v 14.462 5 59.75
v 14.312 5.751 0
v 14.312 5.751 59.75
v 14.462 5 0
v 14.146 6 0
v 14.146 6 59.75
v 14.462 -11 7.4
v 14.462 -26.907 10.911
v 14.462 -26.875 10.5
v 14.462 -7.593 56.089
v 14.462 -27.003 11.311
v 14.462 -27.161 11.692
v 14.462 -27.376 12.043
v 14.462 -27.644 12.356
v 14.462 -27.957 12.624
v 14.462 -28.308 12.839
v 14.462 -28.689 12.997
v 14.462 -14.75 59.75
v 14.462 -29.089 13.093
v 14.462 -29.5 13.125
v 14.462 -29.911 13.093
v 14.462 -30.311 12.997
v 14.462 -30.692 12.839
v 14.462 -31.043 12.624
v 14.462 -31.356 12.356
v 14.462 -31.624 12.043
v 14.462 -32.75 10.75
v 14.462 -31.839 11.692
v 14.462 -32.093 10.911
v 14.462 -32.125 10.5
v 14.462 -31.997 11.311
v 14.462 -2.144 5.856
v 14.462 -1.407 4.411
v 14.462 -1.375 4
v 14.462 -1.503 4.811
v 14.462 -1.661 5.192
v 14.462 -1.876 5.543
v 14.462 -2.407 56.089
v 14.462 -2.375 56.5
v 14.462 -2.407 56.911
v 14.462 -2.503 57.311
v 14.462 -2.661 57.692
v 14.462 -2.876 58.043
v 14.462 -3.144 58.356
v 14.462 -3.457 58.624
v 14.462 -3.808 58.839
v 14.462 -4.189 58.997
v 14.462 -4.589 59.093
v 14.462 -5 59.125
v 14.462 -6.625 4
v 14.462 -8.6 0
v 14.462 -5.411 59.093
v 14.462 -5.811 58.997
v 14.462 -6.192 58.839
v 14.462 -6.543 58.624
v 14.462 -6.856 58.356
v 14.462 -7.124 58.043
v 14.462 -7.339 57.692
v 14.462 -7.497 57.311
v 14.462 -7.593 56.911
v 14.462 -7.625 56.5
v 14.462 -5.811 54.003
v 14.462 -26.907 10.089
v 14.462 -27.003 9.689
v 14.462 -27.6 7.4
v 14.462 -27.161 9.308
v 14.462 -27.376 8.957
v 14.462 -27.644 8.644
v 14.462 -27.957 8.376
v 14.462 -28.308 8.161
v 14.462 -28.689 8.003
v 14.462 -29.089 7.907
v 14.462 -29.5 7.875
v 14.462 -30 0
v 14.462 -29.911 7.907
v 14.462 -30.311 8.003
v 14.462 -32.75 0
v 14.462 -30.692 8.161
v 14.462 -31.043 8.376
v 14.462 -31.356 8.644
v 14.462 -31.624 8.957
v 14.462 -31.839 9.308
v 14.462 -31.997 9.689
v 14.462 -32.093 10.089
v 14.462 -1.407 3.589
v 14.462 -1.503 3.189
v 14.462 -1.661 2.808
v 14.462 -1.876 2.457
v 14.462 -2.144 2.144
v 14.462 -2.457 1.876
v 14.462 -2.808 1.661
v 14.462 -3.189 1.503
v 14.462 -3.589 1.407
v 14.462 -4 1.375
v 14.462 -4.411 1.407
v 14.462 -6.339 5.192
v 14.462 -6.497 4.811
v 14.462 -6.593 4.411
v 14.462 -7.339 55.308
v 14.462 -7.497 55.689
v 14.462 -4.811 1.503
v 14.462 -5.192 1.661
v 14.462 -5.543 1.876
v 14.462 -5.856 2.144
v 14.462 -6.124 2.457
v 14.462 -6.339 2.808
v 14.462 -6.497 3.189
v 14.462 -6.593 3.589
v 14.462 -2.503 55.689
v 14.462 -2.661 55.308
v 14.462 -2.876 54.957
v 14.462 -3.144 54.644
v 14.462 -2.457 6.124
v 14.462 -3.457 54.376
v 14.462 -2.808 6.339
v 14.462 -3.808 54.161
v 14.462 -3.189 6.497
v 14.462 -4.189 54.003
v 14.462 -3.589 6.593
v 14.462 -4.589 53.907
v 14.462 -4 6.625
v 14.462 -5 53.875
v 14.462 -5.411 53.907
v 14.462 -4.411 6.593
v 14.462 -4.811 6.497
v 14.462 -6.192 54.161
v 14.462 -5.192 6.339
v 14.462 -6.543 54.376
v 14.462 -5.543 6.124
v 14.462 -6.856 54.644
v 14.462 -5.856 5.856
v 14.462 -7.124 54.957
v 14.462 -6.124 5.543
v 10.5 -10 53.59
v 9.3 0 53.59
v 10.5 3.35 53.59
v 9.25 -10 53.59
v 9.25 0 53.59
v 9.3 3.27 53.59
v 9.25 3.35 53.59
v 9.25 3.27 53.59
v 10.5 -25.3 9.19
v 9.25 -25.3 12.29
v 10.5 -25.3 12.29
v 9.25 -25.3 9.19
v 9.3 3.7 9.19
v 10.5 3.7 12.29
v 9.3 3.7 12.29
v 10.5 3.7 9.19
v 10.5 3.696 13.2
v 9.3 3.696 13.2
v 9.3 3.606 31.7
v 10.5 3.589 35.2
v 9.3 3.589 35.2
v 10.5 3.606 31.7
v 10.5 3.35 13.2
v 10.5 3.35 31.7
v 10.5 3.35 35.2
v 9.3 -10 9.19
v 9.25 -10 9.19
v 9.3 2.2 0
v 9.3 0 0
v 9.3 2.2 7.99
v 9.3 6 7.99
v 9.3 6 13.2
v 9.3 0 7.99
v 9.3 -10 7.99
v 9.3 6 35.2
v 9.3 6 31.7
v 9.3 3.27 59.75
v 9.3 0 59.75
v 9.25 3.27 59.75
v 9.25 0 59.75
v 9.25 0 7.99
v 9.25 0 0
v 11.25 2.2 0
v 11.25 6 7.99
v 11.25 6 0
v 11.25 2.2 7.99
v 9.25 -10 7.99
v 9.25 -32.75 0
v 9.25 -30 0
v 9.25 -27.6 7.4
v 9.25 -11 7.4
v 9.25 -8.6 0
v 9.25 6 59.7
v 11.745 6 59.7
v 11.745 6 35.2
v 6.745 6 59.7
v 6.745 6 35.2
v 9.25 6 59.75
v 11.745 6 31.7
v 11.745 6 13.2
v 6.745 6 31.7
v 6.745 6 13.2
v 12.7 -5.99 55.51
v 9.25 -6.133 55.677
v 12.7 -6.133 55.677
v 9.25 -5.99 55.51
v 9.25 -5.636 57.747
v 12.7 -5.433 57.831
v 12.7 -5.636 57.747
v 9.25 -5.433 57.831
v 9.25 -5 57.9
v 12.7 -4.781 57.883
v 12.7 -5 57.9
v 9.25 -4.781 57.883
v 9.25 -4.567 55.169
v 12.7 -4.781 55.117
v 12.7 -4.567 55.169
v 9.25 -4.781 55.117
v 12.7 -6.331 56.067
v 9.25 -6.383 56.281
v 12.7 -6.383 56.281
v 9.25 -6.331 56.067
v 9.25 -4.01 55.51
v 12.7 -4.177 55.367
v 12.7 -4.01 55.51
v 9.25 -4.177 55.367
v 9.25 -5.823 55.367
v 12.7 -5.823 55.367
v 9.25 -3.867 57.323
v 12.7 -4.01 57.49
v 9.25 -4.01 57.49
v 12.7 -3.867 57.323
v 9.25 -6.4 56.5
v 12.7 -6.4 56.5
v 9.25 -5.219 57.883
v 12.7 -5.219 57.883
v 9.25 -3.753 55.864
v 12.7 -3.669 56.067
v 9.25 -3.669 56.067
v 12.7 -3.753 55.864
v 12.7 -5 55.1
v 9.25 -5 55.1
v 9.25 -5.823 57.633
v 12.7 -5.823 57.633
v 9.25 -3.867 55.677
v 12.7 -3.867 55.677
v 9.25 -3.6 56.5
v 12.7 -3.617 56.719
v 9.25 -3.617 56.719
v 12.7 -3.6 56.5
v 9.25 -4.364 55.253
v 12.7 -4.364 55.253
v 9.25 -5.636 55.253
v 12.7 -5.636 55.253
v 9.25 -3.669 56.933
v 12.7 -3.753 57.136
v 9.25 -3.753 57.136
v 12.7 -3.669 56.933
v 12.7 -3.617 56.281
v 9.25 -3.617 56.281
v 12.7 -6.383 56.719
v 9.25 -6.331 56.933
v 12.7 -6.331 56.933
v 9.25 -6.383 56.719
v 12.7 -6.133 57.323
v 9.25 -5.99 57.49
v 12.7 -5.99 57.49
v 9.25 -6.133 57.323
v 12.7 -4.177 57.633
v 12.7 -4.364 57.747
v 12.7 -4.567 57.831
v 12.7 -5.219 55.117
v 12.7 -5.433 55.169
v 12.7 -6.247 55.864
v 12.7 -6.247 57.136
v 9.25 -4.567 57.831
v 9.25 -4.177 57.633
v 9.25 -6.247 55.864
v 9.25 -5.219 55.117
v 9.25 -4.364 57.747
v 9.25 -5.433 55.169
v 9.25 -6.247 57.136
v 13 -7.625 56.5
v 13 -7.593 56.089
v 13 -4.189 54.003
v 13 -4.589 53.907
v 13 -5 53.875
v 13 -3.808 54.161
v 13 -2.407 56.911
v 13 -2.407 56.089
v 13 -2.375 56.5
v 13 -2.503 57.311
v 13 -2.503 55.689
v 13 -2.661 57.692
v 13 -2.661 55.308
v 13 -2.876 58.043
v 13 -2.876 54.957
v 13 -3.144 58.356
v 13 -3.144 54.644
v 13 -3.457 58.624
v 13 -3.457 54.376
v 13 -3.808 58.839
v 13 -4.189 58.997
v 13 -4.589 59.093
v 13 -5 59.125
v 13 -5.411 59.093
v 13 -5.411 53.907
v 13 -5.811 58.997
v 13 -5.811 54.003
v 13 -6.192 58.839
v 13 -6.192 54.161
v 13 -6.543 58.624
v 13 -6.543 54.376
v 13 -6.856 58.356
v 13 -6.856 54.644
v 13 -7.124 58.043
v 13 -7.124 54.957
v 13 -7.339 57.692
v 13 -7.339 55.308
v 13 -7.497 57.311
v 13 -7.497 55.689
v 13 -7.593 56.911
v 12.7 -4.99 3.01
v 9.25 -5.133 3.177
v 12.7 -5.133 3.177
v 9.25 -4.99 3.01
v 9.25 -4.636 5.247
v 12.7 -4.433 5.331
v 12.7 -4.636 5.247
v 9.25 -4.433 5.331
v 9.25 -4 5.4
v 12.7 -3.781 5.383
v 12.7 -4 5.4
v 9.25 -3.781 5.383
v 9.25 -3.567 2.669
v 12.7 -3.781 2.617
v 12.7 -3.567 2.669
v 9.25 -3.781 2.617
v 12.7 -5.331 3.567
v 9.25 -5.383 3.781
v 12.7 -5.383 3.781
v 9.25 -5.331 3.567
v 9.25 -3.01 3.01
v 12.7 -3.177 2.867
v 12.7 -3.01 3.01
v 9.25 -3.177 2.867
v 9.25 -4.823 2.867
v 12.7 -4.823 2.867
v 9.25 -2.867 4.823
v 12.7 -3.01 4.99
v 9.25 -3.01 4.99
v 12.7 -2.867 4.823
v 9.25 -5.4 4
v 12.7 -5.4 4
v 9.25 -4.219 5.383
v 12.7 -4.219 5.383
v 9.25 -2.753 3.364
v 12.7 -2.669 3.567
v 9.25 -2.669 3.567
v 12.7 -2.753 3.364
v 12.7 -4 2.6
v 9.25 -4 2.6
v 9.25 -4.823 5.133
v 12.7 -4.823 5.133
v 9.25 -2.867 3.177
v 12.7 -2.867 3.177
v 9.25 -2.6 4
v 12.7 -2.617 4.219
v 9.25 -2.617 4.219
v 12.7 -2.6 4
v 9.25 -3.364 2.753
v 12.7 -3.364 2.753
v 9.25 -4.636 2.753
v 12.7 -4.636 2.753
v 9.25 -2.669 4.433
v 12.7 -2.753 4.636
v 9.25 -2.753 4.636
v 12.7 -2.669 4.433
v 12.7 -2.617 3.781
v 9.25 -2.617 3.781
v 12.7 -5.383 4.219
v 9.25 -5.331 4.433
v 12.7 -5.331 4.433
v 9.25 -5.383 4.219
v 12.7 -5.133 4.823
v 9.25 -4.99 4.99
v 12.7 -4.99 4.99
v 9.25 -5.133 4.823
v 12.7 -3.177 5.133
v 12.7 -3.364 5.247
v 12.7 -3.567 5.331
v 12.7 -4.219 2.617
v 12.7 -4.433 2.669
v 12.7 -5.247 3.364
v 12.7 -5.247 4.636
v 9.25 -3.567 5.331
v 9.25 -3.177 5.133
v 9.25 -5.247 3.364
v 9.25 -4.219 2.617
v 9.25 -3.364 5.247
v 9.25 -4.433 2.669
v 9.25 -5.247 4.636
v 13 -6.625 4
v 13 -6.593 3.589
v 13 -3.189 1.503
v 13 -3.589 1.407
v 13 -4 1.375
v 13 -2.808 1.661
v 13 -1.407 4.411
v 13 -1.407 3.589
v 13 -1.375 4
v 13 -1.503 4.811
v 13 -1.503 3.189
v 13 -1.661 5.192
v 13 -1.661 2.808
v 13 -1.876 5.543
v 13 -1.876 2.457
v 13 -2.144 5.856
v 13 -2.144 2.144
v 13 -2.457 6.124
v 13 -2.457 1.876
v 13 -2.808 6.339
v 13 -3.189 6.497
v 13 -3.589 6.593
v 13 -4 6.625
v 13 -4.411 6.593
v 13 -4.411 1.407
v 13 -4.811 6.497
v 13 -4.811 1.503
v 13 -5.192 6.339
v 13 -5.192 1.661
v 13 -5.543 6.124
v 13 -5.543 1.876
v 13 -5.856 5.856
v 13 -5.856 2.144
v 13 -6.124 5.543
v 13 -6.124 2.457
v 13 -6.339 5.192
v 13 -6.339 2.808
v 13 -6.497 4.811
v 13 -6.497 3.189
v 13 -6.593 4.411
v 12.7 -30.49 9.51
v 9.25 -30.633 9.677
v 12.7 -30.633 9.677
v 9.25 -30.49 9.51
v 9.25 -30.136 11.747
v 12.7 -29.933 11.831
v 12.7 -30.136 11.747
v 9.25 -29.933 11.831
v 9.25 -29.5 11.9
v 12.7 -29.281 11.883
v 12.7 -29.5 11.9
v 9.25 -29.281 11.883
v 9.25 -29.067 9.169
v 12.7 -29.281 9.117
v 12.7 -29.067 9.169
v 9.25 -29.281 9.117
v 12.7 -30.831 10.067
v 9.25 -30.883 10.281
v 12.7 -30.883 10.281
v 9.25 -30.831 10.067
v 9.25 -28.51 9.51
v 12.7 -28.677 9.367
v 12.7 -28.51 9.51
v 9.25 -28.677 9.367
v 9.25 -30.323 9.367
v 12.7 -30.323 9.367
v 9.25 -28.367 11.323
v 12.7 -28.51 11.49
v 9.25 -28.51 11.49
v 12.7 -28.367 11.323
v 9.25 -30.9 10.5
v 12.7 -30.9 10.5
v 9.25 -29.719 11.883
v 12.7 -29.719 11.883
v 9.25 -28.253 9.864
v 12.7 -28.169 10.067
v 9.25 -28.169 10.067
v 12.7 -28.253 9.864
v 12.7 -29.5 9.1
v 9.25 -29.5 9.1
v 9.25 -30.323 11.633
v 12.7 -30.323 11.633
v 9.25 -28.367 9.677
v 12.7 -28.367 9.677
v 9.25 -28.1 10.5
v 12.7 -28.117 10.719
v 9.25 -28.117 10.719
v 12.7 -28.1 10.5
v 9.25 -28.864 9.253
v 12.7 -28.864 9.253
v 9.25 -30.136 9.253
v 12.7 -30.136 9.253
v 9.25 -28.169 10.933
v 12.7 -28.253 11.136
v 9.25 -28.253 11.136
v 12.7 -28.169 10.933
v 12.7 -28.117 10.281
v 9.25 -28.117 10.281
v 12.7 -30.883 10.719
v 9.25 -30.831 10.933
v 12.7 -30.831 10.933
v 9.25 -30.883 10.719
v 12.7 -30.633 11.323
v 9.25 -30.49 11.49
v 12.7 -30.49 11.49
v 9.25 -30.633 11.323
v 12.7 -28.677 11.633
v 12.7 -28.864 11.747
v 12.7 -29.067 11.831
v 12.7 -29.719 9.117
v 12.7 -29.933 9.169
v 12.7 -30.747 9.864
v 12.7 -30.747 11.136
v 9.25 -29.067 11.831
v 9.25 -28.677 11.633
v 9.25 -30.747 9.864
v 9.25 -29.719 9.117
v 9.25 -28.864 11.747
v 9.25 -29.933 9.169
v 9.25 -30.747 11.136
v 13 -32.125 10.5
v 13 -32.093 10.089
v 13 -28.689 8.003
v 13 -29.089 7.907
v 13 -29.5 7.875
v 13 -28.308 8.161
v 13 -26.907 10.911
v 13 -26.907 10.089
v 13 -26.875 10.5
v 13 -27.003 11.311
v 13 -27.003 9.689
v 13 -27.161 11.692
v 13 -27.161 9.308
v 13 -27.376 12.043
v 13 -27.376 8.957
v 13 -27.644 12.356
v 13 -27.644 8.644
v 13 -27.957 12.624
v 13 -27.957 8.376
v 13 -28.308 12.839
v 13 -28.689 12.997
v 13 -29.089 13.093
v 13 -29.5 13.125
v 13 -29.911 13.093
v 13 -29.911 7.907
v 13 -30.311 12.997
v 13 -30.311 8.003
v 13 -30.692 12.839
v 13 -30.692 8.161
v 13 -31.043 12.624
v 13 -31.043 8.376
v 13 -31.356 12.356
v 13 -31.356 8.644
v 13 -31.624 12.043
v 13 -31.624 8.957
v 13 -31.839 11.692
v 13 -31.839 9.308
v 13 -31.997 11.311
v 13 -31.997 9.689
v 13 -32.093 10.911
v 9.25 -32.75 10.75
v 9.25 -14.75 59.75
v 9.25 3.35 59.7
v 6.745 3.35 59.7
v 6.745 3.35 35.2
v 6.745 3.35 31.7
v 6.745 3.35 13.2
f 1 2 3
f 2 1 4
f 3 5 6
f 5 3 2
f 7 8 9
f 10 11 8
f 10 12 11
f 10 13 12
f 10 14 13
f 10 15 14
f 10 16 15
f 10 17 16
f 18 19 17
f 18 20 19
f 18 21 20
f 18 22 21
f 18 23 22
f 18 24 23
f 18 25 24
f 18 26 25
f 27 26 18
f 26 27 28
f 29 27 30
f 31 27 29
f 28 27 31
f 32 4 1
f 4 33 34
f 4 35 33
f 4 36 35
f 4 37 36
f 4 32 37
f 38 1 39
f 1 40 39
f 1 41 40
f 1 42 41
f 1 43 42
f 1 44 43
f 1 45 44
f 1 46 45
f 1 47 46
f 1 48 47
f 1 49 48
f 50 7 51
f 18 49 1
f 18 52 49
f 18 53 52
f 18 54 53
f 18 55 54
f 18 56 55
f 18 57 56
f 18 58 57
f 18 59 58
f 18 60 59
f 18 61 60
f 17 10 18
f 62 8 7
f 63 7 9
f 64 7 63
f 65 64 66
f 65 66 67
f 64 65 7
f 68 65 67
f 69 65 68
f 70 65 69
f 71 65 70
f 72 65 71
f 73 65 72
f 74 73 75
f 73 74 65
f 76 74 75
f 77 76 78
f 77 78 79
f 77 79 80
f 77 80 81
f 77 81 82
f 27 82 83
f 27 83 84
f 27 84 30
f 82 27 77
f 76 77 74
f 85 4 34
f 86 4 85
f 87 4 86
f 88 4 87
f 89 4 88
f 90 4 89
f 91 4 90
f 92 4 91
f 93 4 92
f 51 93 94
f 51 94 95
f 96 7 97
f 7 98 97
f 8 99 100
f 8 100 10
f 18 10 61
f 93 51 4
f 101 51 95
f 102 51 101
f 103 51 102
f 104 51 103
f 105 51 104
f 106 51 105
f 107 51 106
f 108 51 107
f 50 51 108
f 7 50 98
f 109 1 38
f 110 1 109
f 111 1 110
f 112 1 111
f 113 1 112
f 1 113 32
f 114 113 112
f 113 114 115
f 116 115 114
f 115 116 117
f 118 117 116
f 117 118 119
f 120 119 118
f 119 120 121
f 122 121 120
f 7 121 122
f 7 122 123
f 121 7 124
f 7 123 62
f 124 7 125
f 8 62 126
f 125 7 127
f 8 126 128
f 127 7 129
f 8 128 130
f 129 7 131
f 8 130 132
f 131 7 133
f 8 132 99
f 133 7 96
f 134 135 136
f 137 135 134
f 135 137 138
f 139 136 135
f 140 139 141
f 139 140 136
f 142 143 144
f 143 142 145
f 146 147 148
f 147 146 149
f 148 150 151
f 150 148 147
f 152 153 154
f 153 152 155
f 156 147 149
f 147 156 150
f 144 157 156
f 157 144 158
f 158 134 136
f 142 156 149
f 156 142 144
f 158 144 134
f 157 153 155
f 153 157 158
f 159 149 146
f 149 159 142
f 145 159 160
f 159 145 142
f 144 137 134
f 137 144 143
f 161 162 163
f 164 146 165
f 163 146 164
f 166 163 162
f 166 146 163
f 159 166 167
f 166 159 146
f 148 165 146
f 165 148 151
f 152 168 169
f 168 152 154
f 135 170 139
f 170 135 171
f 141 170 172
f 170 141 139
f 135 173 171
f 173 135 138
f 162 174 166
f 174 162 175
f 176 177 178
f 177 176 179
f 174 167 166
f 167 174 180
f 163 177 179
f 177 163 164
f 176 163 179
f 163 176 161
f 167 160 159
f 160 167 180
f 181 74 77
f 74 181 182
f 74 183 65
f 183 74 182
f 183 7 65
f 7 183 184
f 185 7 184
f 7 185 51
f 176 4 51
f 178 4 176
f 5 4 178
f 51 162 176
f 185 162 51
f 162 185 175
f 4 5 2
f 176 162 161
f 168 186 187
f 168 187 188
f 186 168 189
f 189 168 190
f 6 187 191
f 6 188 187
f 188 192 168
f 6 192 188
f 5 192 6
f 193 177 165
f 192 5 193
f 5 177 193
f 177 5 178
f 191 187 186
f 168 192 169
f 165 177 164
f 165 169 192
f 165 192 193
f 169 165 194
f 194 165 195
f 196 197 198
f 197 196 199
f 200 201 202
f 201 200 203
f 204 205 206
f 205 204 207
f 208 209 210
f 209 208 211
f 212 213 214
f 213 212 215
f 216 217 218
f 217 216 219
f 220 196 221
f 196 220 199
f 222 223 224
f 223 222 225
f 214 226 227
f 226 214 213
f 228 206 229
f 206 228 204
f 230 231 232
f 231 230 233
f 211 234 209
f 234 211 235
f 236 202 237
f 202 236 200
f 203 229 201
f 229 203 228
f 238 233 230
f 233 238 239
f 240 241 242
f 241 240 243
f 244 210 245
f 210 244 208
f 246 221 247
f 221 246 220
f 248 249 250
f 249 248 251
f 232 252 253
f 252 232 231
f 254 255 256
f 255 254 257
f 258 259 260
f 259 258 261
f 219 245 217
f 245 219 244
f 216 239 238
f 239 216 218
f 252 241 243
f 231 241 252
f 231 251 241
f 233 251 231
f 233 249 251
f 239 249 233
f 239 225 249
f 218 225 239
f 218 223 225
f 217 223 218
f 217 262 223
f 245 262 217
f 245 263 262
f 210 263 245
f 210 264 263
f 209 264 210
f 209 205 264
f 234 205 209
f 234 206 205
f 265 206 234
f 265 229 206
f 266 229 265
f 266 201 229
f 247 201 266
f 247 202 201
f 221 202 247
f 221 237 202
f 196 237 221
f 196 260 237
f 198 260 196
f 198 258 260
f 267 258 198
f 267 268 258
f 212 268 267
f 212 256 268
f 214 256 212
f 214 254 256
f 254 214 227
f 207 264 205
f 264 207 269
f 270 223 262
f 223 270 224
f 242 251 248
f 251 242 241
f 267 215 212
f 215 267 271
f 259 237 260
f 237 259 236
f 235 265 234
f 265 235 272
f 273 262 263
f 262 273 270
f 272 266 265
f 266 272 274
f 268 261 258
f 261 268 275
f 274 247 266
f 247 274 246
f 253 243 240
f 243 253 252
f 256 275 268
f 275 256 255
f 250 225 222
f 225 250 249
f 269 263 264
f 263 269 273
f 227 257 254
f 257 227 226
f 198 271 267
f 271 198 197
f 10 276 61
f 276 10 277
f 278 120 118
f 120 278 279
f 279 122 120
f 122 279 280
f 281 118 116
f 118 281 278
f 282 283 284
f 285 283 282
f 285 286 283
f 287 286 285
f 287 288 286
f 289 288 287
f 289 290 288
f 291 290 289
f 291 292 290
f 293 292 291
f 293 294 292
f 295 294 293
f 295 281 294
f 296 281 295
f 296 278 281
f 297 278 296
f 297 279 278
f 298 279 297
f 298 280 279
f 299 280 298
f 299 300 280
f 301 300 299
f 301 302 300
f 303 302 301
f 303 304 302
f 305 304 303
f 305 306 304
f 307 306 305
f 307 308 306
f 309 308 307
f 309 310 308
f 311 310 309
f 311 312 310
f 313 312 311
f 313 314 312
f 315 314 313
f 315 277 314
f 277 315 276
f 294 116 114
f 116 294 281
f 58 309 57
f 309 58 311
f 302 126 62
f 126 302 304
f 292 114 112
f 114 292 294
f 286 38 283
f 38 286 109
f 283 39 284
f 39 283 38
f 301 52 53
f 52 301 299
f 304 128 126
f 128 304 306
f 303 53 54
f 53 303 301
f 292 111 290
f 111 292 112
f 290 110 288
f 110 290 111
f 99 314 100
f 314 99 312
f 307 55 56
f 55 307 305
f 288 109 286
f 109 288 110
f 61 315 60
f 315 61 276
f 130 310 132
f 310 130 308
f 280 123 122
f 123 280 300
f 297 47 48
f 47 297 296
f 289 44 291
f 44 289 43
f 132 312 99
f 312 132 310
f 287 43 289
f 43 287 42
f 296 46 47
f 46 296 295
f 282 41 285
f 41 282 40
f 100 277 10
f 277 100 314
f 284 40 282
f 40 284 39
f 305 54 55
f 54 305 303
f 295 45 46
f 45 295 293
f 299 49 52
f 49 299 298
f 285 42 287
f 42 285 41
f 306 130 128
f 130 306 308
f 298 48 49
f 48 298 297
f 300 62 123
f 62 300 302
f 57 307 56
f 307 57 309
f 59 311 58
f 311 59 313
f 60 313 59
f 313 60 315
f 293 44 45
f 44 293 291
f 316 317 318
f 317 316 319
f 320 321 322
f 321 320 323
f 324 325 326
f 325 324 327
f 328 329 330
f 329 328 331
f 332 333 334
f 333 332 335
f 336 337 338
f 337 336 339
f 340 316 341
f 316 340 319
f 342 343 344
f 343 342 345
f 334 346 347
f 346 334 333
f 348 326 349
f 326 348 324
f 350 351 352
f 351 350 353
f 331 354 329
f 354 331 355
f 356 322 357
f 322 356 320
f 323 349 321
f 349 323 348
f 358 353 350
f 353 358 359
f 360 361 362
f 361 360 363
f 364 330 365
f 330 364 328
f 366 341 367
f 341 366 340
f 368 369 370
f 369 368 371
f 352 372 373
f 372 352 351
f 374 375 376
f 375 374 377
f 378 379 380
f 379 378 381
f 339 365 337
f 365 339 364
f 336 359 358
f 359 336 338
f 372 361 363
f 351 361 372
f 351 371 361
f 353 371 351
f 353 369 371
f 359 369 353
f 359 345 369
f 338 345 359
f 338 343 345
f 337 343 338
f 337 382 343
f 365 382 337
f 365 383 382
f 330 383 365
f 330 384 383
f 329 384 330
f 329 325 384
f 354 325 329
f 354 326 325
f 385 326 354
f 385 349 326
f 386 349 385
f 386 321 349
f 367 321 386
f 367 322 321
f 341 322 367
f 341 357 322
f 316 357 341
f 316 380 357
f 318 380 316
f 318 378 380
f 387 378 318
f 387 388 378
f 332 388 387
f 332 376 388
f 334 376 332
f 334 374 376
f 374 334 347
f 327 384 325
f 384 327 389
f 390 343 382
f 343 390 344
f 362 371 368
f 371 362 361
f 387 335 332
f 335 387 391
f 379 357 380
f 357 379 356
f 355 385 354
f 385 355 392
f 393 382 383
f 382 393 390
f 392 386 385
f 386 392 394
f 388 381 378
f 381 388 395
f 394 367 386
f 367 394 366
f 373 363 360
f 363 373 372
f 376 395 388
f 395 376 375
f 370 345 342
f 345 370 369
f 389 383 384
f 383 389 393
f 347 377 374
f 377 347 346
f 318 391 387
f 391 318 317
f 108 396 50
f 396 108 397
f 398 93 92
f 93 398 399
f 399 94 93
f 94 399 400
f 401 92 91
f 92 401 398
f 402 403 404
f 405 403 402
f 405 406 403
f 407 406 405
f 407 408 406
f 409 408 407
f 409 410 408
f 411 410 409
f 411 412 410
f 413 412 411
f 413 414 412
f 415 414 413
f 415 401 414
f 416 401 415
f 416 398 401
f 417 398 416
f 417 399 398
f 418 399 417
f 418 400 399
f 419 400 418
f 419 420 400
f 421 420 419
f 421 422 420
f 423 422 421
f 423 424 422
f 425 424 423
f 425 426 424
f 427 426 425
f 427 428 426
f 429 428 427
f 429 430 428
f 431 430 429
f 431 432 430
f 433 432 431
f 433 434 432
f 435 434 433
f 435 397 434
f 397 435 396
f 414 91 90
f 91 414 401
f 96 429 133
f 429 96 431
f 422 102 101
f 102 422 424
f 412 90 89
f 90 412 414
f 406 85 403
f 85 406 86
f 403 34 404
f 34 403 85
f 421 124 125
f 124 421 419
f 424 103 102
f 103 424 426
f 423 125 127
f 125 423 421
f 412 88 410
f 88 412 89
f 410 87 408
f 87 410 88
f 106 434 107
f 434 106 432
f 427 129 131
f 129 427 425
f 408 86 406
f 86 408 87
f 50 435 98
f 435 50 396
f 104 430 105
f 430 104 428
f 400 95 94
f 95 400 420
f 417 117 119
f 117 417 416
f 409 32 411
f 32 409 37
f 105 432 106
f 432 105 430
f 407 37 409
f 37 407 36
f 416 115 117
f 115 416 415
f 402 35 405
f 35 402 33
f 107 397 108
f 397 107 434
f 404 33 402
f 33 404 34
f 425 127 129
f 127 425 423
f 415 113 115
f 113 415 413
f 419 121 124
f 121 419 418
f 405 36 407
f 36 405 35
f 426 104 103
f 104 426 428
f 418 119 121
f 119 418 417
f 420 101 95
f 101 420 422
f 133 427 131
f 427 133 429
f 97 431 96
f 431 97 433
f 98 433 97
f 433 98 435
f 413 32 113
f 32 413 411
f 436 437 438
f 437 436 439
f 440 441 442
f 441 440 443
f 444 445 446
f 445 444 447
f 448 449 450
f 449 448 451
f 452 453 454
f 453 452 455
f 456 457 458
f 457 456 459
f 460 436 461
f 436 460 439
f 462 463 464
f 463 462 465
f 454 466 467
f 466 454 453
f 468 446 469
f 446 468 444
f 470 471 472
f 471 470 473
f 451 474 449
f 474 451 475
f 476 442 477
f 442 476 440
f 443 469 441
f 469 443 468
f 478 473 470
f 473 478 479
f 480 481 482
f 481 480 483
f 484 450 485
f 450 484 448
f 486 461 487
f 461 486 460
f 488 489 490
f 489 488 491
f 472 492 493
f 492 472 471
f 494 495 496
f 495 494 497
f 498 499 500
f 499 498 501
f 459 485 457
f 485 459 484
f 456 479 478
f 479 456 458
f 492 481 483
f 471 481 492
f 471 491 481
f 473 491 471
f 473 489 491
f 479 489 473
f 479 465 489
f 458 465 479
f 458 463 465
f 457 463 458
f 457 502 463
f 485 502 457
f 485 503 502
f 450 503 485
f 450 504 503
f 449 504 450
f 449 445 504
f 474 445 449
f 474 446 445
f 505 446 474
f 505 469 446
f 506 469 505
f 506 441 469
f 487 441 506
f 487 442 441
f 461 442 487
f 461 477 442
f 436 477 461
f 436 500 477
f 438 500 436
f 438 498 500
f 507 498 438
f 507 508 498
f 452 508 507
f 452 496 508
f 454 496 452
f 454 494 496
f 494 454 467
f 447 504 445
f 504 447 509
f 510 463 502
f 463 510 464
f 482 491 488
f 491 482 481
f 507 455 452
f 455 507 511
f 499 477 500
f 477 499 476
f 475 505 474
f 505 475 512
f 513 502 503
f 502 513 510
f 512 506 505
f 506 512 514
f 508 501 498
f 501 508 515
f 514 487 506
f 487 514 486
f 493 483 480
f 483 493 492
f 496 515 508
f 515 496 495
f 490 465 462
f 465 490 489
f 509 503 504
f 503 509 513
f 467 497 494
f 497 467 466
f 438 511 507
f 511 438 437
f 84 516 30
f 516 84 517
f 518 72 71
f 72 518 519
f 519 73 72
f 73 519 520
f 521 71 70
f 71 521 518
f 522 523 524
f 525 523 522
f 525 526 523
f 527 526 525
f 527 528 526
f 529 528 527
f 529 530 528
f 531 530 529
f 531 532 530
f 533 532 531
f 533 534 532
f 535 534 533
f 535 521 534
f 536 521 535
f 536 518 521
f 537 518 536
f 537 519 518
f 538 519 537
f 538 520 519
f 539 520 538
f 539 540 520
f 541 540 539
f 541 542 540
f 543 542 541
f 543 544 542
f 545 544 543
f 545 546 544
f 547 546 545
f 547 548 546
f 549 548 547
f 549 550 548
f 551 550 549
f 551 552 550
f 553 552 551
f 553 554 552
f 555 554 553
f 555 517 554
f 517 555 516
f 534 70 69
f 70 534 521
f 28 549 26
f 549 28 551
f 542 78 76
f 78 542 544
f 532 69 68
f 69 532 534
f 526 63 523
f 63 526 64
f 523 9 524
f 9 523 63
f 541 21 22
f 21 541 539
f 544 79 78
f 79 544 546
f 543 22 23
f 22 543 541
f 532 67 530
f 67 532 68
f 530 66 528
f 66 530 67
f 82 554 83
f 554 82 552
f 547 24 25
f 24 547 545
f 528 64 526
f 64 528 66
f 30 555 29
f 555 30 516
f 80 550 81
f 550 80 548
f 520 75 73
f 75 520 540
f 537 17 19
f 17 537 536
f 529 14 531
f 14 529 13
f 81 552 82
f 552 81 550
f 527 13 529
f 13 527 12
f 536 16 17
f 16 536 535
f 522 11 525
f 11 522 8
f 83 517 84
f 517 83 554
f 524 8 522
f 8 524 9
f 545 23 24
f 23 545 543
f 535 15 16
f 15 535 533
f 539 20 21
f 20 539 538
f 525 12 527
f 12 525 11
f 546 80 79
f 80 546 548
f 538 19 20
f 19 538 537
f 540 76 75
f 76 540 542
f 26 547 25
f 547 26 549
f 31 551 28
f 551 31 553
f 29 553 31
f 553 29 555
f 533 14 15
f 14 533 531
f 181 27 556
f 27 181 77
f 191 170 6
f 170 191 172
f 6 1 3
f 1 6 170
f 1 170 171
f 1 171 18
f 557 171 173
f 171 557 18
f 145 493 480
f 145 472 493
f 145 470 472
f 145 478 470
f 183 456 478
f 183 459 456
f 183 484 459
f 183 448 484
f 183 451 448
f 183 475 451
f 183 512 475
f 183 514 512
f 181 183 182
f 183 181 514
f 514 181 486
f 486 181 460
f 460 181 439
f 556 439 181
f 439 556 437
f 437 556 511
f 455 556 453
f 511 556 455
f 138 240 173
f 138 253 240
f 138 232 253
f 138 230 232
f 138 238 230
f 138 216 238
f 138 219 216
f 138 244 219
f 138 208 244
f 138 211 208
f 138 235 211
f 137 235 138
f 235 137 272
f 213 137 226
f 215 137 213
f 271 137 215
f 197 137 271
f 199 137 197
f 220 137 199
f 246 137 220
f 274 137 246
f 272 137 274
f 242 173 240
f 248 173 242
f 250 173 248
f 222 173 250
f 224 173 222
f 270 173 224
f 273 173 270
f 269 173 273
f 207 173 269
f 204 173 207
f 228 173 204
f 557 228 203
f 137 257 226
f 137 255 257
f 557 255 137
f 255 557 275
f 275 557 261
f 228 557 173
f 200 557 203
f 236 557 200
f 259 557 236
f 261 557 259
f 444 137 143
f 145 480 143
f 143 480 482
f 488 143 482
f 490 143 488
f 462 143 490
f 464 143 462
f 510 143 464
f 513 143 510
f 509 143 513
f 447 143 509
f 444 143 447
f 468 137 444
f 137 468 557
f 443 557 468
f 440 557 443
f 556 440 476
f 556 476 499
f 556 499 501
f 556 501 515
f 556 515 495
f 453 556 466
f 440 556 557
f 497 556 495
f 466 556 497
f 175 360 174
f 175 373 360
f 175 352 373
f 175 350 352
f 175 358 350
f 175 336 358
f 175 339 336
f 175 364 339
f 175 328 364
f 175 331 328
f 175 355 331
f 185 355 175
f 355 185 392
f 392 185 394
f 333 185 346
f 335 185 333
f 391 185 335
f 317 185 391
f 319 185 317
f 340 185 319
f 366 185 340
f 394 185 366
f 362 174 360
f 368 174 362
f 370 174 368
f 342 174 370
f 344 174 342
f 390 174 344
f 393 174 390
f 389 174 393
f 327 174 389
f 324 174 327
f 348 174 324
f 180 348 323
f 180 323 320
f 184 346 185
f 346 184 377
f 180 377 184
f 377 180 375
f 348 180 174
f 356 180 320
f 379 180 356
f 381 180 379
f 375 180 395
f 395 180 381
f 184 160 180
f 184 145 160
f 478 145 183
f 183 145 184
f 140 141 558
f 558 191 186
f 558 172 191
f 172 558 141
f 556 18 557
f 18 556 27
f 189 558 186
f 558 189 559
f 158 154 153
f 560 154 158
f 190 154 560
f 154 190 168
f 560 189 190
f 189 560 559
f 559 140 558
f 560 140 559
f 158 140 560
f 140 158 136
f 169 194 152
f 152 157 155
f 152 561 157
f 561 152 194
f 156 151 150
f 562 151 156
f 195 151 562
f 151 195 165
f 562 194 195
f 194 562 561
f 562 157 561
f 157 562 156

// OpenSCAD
$fn=40;

//% import("./stryfe-front-control-v2-door.stl");
//% import("./stryfe-front-control-v2-body.stl");

if (0) {
   % translate([-11.5,0,0]) {
      rotate([00,90,90]) import("./Nerf_Stryfe_Foregrip/files//StryfeForeGripMK2-Plate.stl");
      rotate([0,90,90]) import("./Nerf_Stryfe_Foregrip/files//StryfeForeGripMK2.stl");
   }
}

// translate([-10.2,-15,17]) rotate([0,-90,0]) button();
// translate([7,-17.5-3,10.4]) rotate([-20,0,0]) rotate([0,-90,90]) switch();
// translate([0,23,0]) button();
// screws(cut=1);

//main();
door();

module door() {
   screws(cut=0,mat=1);

   intersection() {
      difference() {
         newExterior();
         cutout(side=0);
         screws(cut=1,mat=0);
         translate([6,-17.5-3,10.4]) rotate([-20,0,0]) rotate([0,-90,90]) switch(cutout=0,body=0,screws=1);
      }
      translate([0.25,0.25,-0.25]) sideCut();
   }

   translate([1.745+5,3.35,35.2]) cube([5,2.65,24.5]);
   translate([1.745+5,3.35,13.2]) cube([5,2.65,18.5]);
}

module main() {
   screws(cut=0,mat=1);

   difference() {
      newExterior();
      cutout(side=1);
      screws(cut=1,mat=0);
      translate([6,-17.5-3,10.4]) rotate([-20,0,0]) rotate([0,-90,90]) switch(cutout=0,body=0,screws=1);
      translate([1.745+4,3.25,35.25]) cube([5,2.9,24.75]); /* leftover */
   }
}

module button(cut=0) {
   myHt = 6;

   if (cut == 0) {
      for(i=[0:2]) {
         difference() {
            cylinder(d=8-i*2,h=myHt+0.2*i);
            translate([0,0,myHt-0.6+0.2*i]) cylinder(d=7-i*2,h=myHt);
         }
      }
      cylinder(d=8-6,h=myHt+0.6);
      cylinder(d=13,h=1.2);
   }
   else {
      cylinder(d=8+0.2,h=myHt+0.6);
      translate([0,0,-7]) cylinder(d=13+0.2,h=1.2+8);
   }
}


module sideCut() {
   translate([6.5,0,0]) union() {
      rotate([90,0,-90])
      translate([0,0,-12.5]) linear_extrude(height=10)
      polygon(points=[[-7,-1],[-7,60],[15,60],
                      [33,11], [33,-1],[10,-1]]);
   }
}

module screws(cut=0,mat=1) {
   if (0) {
      translate([-13,-5,56]) rotate([0,90,0]) difference() {
         cylinder(h=24,d2=6,d1=9);
         translate([0,0,1]) cylinder(h=24,d=2.8);
      }
   }
   if (cut) {
      translate([-13,-5,56.5]) rotate([0,90,0]) {
         translate([0,0,3]) cylinder(h=22.7,d=2.8);
         translate([0,0,26]) cylinder(h=10,d=5.25);
      }
      translate([-13,-4,4]) rotate([0,90,0]) {
         translate([0,0,3]) cylinder(h=22.7,d=2.8);
         translate([0,0,26]) cylinder(h=10,d=5.25);
      }
      translate([-13,-29.5,10.5]) rotate([0,90,0]) {
         translate([0,0,3]) cylinder(h=22.7,d=2.8);
         translate([0,0,26]) cylinder(h=10,d=5.25);
      }
   }
}

module newExterior() {
   minkowski($fn=16) {
      union() {
         rotate([90,0,-90])
         translate([0,0,-12.5]) linear_extrude(height=26)
         polygon(points=[[-5,0],[-5,91],[8,91],
                      [37,10], [37,0],[10,0]]);
      }
      sphere(r=2);
   }

   /* bling */
   minkowski($fn=16) {
      union() {
         rotate([90,0,-90])
         translate([1,0,9]) linear_extrude(height=6)
         polygon(points=[[0,28],[0,80],[5,80], [23,28]]);
      }
      sphere(r=2);
   }
}

module switch(body=1,cutout=1,screws=1) {
   if (body) translate([0,0,-5]) color("red") difference() {
      union() {
         translate([27,4,0]) cube([11.5,1,10]);
         translate([27,9,0]) cube([11.5,1,10]);
         translate([15,-3,0]) cube([13.5,1,10]);
         translate([15,-3,0]) cube([1,4,10]);
         translate([6,15,3.5]) cube([3,3,3]);
         hull() {
            translate([1.5,13.5,0]) cylinder(r=1.5,h=10);
            translate([1.5,1.5,0]) cylinder(r=1.5,h=10);
            translate([28.5,13.5,0]) cylinder(r=1.5,h=10);
            translate([28.5,1.5,0]) cylinder(r=1.5,h=10);
         }
      }
      if (cutout) {
         translate([3.0,2.0,-0.1]) cylinder(d=3,h=11);
         translate([27,12,-0.1]) cylinder(d=3,h=11);
      }
   }
   if (screws) translate([0,0,-5]) {
      translate([5.0,1.25,0]) cylinder(d=2.8,h=18);
      translate([5.0,1.25,-25]) cylinder(d=5.5,h=25);
      translate([27,12,0]) cylinder(d=2.8,h=18);
      translate([27,12,-8]) cylinder(d=5.5,h=8);
   }
}

/* dimensions
 * 18.6mm outside of rail
 * 13.49 between edges going into rail
 * 3.07 thick piece going into rail
 * 3.27 under the rail clearance
 */

/* interior volume to cut out */
module cutout(side=0) {
   translate([0,0,-0.01]) {
      hull() {
         translate([-23/2-1,-7-3,53]) cube([23,13.5,0.6]) ;
         translate([-23/2-1,-25.3,9.2]) cube([23,29.0,3.1]);
      }
      translate([-13.49/2,+6.34-4,0]) cube([13.49, 4, 100]);
      translate([-18.6/2,0,0]) cube([18.6, 3.27, 100]);
      translate([-22.5/2,2.2,0]) cube([22.5, 4, 8]); // circular spots

      /* this one gets the notch in the rail */
      translate([-18.6/2,-10,8]) cube([18.6, 20, 35]);
   }
   outsideSlice();
   translate([-10.75,-18,17.5]) rotate([0,-90,0]) button(cut=1);

   if (side > 0) {
      sideCut();
   }
}

module outsideSlice() {
   translate([20,0,0]) rotate([90,0,-90]) linear_extrude(height=40)
   if (1) {
      polygon(points=[[-6,0],[-6,87],[-6,93],[0,100],[-10,100],[-10,-5],
                   [80,-5],[80,0],[30,0],[27.6,7.4],[11,7.4],[8.6,0]]);
   }
}

module exterior() {
   for (i=[0:5]) {
      translate([0,0,15.5*i]) grip(len=45,width=30);
   }
   translate([0,0,0]) grip(len=44,width=27,ht=85);
   translate([-27/2,-40+6.33,0]) cube([27,40,85]);
}

module grip(len=50,width=30,ht=6) {
   $fn=40;
   if (1) {
      linear_extrude(height=ht) translate([0,2-(len-8)/2+0.3,0]) minkowski() {
         square([(width-8),(len-8)],center=true);
         circle(r=4);
      }
   } else {
      /* bad idea */
      minkowski() {
         translate([0,2-(len-8)/2+0.3,0]) cube([width-8,len-8,1],center=true);
         sphere(r=4);
      }
   }
}
